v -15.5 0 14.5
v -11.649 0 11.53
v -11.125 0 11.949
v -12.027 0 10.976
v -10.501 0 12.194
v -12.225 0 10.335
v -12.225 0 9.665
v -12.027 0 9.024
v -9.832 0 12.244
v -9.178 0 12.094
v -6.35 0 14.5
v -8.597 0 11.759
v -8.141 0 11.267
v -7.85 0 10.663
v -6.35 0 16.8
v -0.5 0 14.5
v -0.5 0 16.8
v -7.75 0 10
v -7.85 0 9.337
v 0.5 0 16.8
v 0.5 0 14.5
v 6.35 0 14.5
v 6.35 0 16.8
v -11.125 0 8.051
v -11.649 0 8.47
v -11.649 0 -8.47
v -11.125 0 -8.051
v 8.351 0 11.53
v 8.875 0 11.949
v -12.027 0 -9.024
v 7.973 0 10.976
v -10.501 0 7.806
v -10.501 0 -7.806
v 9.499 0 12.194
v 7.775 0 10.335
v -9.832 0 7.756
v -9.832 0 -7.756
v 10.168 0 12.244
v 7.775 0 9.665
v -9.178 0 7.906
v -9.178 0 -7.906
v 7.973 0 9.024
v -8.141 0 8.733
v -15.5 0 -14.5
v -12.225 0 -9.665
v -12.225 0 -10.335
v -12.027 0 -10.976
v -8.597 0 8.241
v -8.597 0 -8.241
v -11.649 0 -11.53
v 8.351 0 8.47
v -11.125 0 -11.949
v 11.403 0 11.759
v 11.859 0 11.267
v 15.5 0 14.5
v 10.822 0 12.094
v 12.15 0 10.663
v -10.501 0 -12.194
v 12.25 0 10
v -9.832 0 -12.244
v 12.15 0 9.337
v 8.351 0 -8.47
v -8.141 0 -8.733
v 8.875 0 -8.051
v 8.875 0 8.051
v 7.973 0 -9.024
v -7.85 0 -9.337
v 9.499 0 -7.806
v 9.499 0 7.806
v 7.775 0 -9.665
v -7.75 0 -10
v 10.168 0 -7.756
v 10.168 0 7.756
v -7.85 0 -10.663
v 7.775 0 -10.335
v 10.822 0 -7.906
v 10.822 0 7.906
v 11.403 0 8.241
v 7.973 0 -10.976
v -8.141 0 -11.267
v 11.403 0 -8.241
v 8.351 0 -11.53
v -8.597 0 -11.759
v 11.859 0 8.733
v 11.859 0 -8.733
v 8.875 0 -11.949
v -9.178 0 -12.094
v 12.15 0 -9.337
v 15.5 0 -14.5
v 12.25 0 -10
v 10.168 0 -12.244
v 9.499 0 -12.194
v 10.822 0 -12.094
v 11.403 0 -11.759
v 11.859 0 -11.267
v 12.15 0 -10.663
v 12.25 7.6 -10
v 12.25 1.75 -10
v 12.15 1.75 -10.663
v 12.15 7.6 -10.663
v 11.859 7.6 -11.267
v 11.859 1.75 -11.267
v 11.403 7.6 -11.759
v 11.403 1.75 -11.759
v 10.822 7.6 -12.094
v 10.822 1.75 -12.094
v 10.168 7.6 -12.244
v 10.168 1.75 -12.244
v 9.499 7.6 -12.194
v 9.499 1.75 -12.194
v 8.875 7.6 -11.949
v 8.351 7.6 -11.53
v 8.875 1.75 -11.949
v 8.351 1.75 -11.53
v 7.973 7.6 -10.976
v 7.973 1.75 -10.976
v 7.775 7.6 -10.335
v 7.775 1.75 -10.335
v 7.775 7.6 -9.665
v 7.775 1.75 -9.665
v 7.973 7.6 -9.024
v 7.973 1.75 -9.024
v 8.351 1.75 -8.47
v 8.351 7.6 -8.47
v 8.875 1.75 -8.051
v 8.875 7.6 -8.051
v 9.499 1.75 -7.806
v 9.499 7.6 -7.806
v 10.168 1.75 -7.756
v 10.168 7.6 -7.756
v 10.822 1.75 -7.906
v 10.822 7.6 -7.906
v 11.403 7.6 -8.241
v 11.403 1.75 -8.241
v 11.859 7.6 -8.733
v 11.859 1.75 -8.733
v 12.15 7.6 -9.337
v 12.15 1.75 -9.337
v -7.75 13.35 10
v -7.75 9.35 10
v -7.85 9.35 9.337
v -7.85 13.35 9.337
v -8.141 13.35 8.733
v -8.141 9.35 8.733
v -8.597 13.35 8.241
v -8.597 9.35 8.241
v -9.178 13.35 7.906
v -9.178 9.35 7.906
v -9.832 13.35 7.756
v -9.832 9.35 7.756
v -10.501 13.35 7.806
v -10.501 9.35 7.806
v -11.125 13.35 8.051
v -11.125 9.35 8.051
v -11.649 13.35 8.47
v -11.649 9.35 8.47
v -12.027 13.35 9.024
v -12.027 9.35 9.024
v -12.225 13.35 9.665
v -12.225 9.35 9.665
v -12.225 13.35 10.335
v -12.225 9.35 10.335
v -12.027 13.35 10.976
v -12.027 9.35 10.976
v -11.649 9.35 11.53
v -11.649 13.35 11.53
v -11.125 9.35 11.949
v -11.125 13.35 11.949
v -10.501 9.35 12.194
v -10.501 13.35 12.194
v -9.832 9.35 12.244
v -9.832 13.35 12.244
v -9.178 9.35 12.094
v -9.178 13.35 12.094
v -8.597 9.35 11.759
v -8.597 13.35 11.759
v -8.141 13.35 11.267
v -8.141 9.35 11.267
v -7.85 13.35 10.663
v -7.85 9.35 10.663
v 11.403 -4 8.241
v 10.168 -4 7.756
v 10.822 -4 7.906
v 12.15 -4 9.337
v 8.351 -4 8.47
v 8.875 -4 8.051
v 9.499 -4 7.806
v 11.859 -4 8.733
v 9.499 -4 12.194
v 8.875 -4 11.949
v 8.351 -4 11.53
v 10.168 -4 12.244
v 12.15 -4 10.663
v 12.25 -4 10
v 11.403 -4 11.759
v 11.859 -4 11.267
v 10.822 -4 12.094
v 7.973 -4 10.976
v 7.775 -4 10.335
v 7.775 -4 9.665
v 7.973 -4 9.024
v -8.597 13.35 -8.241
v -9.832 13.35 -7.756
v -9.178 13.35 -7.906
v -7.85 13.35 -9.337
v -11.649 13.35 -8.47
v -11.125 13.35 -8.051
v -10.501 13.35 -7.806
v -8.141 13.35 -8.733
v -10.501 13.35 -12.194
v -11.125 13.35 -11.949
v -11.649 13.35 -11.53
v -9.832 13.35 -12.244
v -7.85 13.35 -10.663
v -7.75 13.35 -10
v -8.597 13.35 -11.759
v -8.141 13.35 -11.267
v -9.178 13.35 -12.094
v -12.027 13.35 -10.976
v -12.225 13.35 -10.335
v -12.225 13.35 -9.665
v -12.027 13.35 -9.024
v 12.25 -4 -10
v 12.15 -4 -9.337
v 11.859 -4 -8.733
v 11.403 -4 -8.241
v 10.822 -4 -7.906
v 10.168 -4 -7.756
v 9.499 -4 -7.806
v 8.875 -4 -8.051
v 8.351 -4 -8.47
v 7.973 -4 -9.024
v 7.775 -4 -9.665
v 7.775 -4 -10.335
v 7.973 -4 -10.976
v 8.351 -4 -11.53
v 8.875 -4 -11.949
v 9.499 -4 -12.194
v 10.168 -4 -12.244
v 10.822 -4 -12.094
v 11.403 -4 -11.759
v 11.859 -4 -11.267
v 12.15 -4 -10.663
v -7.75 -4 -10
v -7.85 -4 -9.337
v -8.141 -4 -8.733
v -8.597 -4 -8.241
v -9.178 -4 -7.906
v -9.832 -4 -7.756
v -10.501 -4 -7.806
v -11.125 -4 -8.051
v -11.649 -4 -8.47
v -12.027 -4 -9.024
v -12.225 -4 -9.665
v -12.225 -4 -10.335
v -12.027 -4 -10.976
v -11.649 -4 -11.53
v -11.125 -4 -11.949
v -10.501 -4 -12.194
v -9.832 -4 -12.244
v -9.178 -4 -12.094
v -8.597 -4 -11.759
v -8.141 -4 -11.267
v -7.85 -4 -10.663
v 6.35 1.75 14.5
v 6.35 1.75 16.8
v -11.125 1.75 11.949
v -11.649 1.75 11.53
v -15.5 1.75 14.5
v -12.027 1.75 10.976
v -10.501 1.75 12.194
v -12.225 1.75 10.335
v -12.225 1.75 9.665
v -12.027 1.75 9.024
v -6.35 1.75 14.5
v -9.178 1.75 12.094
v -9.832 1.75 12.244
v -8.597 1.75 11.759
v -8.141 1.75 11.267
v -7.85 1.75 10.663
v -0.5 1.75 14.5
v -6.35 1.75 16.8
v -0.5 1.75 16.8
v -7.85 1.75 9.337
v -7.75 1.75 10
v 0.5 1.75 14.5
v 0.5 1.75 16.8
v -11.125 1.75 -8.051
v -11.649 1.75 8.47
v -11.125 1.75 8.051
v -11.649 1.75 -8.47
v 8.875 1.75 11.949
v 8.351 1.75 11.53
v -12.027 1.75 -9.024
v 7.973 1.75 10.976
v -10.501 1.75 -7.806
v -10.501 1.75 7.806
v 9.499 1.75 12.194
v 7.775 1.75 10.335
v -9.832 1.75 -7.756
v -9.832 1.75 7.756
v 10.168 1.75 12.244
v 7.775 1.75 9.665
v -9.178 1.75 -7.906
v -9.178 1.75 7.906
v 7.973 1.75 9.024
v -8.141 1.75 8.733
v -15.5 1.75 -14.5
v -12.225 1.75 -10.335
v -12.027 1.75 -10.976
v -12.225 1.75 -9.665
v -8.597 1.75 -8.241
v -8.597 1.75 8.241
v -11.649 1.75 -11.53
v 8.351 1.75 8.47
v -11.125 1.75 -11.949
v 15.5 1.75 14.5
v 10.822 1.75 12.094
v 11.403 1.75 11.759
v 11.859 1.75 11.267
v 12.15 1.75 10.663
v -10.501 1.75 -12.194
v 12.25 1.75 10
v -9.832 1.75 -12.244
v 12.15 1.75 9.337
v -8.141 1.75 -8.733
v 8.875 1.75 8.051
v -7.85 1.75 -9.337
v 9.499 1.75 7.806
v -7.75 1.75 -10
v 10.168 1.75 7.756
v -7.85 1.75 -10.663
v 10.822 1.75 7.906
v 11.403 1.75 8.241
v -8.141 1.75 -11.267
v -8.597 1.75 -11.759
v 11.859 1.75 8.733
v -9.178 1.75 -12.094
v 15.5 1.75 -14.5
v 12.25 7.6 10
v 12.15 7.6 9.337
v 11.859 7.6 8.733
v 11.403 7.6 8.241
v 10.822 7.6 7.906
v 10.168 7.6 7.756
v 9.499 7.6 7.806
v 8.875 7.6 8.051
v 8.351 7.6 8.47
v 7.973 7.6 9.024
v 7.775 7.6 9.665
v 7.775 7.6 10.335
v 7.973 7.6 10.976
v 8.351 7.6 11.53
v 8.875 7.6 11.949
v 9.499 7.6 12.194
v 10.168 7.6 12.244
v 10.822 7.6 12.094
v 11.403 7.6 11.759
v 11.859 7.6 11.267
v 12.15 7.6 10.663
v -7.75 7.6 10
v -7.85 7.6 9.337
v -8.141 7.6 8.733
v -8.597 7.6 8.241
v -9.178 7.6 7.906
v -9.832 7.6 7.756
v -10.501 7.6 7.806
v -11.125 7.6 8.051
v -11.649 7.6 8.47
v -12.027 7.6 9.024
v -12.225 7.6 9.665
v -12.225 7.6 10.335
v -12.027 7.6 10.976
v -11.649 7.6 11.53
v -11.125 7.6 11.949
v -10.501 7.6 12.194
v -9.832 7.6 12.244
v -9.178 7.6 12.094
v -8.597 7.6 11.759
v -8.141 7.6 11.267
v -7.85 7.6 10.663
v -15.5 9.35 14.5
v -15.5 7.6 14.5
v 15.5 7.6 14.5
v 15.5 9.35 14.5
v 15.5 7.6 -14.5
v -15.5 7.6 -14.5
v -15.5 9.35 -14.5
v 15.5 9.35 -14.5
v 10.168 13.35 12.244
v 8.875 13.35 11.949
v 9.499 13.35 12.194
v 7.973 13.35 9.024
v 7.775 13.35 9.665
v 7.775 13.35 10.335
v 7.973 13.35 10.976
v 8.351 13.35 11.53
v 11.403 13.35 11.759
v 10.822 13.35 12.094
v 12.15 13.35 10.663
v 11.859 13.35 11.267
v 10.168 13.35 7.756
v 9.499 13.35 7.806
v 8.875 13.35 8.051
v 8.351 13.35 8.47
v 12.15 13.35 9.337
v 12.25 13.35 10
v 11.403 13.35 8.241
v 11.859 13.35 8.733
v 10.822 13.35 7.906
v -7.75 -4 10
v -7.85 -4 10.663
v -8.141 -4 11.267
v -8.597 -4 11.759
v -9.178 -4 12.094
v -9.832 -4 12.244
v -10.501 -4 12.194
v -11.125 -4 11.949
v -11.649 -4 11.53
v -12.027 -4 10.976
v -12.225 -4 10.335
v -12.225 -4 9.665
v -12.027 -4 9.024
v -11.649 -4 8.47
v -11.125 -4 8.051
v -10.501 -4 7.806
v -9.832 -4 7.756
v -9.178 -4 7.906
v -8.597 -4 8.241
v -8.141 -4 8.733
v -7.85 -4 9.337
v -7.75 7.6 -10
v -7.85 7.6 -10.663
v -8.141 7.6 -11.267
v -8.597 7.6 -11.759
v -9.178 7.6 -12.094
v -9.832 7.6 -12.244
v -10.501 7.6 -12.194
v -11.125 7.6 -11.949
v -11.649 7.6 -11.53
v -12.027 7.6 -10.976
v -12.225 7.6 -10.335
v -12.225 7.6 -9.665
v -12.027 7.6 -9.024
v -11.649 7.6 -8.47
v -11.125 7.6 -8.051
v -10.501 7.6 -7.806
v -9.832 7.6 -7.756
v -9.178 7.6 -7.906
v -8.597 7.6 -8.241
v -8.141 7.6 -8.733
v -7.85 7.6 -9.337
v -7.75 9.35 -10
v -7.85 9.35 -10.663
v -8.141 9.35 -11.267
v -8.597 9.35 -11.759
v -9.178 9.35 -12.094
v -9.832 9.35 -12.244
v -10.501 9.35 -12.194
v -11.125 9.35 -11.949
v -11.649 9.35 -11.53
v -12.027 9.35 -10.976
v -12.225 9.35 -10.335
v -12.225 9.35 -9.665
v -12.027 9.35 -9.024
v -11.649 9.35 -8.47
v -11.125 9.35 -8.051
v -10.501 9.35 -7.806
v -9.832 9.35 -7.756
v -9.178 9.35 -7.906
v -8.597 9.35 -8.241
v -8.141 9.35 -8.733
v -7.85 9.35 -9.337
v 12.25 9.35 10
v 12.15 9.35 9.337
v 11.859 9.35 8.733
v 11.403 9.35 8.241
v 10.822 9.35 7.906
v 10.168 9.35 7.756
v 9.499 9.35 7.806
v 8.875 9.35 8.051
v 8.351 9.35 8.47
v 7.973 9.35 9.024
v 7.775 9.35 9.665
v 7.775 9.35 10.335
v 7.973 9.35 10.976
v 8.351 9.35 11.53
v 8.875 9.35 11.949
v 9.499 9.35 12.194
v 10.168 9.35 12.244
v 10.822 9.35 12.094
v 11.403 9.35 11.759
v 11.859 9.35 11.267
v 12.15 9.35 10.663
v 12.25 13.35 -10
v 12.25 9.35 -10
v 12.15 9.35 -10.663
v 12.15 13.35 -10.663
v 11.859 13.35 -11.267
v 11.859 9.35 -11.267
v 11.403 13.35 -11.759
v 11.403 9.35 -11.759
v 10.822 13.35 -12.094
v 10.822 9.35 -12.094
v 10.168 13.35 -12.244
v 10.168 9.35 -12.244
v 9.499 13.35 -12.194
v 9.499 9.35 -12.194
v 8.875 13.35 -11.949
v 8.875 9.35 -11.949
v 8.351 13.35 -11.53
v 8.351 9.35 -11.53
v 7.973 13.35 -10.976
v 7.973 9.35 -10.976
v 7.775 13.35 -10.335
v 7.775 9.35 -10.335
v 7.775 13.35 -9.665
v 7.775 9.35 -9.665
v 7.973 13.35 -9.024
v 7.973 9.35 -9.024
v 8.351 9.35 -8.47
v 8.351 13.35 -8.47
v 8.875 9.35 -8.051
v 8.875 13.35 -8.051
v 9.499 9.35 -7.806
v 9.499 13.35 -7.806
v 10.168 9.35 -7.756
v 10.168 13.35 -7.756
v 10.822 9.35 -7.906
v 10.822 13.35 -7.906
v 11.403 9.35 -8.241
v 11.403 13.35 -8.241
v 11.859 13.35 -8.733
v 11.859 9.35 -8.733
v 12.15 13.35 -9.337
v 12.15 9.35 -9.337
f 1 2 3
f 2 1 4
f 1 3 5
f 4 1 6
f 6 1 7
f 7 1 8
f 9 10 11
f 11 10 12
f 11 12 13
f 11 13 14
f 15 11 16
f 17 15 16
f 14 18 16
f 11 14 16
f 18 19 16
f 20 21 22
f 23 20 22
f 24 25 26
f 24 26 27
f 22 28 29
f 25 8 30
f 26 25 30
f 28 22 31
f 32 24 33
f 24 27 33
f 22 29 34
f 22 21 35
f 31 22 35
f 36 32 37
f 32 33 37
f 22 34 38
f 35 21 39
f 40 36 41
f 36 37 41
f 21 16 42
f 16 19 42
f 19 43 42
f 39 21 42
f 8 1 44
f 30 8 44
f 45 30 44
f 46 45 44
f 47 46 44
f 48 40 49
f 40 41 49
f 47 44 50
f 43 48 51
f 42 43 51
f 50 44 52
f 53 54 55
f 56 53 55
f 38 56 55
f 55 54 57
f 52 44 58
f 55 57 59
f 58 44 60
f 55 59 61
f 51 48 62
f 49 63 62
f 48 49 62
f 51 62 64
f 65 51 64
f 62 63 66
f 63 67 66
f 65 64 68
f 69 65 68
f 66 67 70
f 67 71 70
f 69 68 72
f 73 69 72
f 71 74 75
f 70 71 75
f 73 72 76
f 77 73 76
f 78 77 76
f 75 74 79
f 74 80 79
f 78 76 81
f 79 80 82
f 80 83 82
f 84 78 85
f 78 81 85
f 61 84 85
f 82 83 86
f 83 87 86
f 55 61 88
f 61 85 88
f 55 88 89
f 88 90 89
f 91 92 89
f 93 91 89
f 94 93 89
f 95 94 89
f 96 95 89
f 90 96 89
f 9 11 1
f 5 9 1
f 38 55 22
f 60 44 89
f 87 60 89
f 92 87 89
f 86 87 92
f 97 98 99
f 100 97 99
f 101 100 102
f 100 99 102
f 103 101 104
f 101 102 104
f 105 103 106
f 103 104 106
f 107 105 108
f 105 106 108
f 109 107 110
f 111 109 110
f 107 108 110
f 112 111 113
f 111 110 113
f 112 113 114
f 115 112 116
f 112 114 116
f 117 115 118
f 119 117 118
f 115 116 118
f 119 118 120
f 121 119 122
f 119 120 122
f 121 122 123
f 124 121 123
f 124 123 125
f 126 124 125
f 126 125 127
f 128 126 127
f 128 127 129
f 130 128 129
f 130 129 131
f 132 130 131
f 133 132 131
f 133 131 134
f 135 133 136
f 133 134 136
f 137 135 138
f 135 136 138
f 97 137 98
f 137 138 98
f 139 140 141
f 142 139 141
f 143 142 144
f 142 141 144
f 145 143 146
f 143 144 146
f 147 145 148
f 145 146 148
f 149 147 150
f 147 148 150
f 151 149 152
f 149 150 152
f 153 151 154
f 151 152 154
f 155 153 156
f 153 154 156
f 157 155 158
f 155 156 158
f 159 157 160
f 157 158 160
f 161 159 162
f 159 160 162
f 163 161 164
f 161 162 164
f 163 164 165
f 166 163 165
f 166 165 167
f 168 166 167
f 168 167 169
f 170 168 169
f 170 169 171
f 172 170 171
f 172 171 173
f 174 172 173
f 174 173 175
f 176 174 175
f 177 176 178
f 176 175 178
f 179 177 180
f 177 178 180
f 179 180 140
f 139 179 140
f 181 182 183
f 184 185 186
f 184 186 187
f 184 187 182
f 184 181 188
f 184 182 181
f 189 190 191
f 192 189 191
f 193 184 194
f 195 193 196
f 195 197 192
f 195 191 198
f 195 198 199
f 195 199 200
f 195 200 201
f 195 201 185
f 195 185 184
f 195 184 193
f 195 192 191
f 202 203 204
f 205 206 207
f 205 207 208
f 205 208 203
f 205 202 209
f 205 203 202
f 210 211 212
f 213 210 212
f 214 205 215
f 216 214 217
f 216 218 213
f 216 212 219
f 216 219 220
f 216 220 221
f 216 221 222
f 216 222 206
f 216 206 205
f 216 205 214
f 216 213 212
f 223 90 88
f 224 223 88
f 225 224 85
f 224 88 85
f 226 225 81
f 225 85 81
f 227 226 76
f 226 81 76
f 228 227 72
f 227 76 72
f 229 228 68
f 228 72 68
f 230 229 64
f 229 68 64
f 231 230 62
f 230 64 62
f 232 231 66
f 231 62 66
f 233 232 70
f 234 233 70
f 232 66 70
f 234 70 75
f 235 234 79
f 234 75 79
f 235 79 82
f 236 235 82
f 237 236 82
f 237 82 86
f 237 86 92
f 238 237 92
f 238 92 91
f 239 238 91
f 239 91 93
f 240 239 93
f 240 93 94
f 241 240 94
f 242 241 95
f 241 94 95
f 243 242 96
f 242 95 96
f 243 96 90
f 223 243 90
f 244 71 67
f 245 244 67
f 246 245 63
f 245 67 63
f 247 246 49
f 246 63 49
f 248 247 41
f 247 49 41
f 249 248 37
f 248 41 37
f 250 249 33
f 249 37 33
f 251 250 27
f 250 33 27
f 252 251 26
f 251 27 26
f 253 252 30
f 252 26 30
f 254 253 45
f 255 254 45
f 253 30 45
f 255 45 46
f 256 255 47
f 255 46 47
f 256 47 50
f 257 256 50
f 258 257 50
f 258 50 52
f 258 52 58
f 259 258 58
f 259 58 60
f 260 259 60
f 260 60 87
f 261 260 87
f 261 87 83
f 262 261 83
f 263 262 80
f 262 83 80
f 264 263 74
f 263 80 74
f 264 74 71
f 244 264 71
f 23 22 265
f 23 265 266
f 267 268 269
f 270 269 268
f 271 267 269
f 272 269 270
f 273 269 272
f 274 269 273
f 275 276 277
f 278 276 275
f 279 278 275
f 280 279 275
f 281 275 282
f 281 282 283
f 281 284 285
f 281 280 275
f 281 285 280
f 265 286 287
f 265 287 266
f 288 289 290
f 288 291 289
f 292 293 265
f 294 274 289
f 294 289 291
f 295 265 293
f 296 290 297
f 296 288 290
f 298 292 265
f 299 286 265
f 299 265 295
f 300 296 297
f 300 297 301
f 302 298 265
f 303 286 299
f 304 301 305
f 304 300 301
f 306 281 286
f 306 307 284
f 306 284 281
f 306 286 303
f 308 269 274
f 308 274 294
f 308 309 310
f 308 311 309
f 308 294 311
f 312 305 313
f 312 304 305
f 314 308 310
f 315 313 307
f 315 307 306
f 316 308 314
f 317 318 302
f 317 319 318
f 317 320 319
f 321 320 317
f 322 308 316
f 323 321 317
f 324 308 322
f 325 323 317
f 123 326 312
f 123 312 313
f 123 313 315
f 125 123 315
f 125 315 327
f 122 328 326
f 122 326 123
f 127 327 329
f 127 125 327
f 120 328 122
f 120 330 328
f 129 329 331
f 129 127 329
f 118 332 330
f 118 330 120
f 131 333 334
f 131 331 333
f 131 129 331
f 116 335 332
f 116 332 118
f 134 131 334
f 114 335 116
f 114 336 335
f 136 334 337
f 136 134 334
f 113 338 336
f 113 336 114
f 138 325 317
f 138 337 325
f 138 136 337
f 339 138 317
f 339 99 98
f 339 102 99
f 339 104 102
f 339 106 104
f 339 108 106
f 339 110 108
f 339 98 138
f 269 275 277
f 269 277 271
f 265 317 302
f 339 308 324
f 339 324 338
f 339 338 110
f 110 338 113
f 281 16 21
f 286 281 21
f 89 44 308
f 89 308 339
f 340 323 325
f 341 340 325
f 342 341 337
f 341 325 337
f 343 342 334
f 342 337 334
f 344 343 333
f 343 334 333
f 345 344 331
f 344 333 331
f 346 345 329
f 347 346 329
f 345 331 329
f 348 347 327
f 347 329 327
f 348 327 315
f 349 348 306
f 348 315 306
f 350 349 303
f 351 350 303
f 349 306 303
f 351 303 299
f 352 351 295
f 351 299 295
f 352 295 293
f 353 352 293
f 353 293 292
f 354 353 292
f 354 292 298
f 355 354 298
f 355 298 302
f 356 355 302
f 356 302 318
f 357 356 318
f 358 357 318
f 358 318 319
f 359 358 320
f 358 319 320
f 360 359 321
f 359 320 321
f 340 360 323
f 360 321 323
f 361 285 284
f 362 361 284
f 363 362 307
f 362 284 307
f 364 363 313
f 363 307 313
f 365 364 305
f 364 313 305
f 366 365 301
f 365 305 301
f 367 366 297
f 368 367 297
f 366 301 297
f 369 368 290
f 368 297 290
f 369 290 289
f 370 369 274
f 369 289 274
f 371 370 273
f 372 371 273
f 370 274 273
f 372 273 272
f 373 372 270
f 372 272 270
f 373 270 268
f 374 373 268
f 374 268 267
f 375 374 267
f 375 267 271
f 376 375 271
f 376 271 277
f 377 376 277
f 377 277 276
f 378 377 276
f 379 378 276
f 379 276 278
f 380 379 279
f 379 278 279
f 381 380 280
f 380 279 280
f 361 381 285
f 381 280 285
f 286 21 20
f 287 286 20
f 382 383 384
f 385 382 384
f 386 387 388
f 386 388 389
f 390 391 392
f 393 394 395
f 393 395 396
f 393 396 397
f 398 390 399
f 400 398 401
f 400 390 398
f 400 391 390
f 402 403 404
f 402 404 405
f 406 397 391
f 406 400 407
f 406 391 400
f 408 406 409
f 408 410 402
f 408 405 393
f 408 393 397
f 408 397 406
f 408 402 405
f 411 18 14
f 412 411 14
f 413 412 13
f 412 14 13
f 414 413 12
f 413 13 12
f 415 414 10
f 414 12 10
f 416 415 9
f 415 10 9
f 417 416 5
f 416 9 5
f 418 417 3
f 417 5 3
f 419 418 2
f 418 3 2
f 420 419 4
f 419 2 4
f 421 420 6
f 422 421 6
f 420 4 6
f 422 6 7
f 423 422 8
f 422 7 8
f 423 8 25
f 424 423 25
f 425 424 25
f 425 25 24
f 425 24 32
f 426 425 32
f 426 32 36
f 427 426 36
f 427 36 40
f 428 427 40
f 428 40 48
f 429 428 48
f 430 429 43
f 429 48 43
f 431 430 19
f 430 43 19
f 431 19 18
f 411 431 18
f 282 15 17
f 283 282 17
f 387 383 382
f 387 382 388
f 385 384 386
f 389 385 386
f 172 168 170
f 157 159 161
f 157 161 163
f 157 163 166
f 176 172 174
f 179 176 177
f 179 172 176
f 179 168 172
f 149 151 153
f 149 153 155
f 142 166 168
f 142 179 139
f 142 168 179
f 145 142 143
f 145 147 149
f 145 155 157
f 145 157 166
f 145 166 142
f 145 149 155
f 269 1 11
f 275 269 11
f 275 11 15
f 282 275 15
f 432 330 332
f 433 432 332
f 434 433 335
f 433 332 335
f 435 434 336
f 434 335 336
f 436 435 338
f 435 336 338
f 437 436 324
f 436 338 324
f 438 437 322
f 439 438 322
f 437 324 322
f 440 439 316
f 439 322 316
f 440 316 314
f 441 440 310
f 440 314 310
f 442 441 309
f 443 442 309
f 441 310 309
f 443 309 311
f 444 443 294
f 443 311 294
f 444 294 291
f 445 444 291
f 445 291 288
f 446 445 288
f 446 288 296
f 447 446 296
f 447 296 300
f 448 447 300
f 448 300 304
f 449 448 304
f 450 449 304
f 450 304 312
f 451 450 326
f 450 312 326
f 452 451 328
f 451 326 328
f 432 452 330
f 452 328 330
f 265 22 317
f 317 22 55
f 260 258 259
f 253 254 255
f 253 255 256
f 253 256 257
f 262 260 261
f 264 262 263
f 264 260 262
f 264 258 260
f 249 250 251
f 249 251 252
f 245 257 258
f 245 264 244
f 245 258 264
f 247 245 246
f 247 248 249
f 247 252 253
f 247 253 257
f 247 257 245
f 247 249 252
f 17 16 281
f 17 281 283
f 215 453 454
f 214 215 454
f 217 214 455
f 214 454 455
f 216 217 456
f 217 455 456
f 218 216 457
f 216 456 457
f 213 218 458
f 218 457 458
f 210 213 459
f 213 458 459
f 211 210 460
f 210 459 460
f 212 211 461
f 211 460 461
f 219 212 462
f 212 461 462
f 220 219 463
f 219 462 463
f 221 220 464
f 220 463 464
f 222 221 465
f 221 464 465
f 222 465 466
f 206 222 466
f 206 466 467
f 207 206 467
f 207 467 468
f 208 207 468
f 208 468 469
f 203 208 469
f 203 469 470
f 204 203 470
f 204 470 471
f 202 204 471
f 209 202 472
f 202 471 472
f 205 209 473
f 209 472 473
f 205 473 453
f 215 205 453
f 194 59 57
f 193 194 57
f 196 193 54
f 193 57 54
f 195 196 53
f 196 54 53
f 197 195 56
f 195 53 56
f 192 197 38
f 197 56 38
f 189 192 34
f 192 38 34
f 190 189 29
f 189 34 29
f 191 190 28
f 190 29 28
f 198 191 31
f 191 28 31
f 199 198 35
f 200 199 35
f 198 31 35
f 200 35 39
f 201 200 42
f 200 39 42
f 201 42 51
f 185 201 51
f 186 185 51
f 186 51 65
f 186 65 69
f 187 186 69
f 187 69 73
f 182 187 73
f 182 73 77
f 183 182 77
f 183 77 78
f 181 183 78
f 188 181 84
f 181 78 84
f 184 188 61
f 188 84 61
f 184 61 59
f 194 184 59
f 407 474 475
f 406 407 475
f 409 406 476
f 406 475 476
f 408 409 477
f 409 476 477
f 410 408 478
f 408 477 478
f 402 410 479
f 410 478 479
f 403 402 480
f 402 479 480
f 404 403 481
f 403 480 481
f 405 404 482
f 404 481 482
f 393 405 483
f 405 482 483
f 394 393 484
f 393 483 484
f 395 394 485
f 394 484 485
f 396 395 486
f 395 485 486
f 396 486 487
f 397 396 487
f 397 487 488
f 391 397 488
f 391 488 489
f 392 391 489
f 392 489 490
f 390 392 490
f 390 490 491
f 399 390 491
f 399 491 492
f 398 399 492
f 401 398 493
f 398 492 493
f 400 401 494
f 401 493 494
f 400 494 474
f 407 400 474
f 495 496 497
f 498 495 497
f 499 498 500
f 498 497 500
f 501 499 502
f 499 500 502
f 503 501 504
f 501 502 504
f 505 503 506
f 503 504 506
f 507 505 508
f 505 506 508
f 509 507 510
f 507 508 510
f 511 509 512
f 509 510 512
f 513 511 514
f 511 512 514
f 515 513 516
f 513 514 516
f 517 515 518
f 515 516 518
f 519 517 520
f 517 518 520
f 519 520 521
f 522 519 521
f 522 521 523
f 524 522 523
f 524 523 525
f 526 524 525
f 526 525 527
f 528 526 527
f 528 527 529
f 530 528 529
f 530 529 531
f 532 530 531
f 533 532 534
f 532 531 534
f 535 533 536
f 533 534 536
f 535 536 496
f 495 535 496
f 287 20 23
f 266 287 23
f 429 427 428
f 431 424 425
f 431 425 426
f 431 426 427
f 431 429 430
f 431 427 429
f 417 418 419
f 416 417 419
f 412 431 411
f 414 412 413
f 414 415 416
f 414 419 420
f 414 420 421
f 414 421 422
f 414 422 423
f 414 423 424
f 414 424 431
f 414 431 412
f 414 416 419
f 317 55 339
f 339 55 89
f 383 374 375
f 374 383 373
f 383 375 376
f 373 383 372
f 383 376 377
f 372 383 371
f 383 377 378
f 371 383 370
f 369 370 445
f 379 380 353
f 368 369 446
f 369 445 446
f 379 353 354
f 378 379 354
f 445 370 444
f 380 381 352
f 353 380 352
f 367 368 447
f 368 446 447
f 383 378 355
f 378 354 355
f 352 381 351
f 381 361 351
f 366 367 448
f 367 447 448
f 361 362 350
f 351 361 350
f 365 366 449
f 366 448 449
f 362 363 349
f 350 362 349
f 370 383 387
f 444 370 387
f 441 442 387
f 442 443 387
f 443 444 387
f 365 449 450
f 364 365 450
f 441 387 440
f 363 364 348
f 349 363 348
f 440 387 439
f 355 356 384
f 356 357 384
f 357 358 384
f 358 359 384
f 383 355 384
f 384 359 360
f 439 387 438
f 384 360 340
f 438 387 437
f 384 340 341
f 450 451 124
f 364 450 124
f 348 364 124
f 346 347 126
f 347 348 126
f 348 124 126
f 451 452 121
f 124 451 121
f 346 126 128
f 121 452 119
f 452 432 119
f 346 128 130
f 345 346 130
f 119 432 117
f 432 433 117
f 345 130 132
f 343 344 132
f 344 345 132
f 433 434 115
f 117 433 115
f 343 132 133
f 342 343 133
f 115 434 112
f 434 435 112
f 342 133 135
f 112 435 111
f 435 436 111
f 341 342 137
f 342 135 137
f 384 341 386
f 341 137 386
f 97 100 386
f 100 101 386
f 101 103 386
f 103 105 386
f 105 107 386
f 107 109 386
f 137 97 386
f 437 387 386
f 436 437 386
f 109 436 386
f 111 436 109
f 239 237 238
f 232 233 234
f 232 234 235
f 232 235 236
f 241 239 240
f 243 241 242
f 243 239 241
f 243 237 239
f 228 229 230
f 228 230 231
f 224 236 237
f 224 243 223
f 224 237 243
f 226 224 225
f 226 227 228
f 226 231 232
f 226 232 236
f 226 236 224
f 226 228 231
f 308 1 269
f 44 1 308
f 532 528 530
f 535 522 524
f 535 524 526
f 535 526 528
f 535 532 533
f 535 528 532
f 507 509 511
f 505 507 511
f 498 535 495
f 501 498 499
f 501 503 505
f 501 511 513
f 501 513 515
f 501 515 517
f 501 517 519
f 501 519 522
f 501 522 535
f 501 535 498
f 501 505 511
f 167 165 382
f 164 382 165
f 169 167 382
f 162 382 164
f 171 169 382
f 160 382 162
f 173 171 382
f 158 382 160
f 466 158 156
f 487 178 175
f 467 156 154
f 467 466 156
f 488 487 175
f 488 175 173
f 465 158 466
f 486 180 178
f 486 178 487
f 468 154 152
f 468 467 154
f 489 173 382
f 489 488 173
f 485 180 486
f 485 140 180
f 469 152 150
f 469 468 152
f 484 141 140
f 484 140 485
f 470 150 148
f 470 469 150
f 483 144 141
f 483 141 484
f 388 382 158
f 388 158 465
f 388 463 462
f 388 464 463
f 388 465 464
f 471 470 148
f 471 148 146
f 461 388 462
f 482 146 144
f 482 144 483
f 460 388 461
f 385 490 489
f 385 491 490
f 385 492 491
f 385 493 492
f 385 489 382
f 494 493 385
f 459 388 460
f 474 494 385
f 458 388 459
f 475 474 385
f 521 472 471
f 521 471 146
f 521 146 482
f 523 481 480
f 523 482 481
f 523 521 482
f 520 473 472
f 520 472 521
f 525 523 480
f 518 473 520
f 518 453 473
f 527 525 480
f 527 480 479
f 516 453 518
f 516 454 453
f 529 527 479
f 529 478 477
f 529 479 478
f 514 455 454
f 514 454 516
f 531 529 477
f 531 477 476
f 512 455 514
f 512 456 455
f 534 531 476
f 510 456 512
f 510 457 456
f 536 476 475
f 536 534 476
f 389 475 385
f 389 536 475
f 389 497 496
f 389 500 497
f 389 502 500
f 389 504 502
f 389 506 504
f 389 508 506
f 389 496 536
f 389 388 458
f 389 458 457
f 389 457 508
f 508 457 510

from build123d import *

# Parameters (mm, degrees)
SKETCH1_W           = 31
SKETCH1_H           = 29
BOSS_EXTRUDE1_DEPTH = 1.75
SKETCH2_R           = 2.25
BOSS_EXTRUDE2_DEPTH = 5.85
SKETCH3_W           = 31
SKETCH3_H           = 29
BOSS_EXTRUDE3_DEPTH = 1.75
SKETCH4_R           = 2.25
BOSS_EXTRUDE4_DEPTH = 4
SKETCH5_R           = 2.25
BOSS_EXTRUDE5_DEPTH = 4
SKETCH6_W           = 5.85
SKETCH6_H           = 2.3
BOSS_EXTRUDE6_DEPTH = 1.75


with BuildPart() as part:
    # Sketch1 → Boss-Extrude1 (new body)
    with BuildSketch(Plane(origin=(0, 0, 0), x_dir=(1, 0, 0), z_dir=(0, 1, 0))):
        Rectangle(SKETCH1_W, SKETCH1_H)
    extrude(amount=BOSS_EXTRUDE1_DEPTH)

    # Sketch2 → Boss-Extrude2 (add)
    with BuildSketch(Plane(origin=(0, 1.75, 0), x_dir=(1, 0, 0), z_dir=(0, 1, 0))):
        with Locations((-10, 10)):
            Circle(SKETCH2_R)
        with Locations((10, 10)):
            Circle(SKETCH2_R)
        with Locations((10, -10)):
            Circle(SKETCH2_R)
        with Locations((-10, -10)):
            Circle(SKETCH2_R)
    extrude(amount=BOSS_EXTRUDE2_DEPTH)

    # Sketch3 → Boss-Extrude3 (add)
    with BuildSketch(Plane(origin=(0, 7.6, 0), x_dir=(1, 0, 0), z_dir=(0, 1, 0))):
        Rectangle(SKETCH3_W, SKETCH3_H)
    extrude(amount=BOSS_EXTRUDE3_DEPTH)

    # Sketch4 → Boss-Extrude4 (add)
    with BuildSketch(Plane(origin=(0, 9.35, 0), x_dir=(1, 0, 0), z_dir=(0, 1, 0))):
        with Locations((-10, 10)):
            Circle(SKETCH4_R)
        with Locations((10, 10)):
            Circle(SKETCH4_R)
        with Locations((10, -10)):
            Circle(SKETCH4_R)
        with Locations((-10, -10)):
            Circle(SKETCH4_R)
    extrude(amount=BOSS_EXTRUDE4_DEPTH)

    # Sketch5 → Boss-Extrude5 (add)
    with BuildSketch(Plane.XZ):
        with Locations((10, 10)):
            Circle(SKETCH5_R)
        with Locations((10, -10)):
            Circle(SKETCH5_R)
        with Locations((-10, -10)):
            Circle(SKETCH5_R)
        with Locations((-10, 10)):
            Circle(SKETCH5_R)
    extrude(amount=BOSS_EXTRUDE5_DEPTH)

    # Sketch6 → Boss-Extrude6 (add)
    with BuildSketch(Plane.XZ):
        with Locations((3.425, 15.65)):
            Rectangle(SKETCH6_W, SKETCH6_H)
        with Locations((-3.425, 15.65)):
            Rectangle(SKETCH6_W, SKETCH6_H)
    extrude(amount=-BOSS_EXTRUDE6_DEPTH)


solid = part.part
